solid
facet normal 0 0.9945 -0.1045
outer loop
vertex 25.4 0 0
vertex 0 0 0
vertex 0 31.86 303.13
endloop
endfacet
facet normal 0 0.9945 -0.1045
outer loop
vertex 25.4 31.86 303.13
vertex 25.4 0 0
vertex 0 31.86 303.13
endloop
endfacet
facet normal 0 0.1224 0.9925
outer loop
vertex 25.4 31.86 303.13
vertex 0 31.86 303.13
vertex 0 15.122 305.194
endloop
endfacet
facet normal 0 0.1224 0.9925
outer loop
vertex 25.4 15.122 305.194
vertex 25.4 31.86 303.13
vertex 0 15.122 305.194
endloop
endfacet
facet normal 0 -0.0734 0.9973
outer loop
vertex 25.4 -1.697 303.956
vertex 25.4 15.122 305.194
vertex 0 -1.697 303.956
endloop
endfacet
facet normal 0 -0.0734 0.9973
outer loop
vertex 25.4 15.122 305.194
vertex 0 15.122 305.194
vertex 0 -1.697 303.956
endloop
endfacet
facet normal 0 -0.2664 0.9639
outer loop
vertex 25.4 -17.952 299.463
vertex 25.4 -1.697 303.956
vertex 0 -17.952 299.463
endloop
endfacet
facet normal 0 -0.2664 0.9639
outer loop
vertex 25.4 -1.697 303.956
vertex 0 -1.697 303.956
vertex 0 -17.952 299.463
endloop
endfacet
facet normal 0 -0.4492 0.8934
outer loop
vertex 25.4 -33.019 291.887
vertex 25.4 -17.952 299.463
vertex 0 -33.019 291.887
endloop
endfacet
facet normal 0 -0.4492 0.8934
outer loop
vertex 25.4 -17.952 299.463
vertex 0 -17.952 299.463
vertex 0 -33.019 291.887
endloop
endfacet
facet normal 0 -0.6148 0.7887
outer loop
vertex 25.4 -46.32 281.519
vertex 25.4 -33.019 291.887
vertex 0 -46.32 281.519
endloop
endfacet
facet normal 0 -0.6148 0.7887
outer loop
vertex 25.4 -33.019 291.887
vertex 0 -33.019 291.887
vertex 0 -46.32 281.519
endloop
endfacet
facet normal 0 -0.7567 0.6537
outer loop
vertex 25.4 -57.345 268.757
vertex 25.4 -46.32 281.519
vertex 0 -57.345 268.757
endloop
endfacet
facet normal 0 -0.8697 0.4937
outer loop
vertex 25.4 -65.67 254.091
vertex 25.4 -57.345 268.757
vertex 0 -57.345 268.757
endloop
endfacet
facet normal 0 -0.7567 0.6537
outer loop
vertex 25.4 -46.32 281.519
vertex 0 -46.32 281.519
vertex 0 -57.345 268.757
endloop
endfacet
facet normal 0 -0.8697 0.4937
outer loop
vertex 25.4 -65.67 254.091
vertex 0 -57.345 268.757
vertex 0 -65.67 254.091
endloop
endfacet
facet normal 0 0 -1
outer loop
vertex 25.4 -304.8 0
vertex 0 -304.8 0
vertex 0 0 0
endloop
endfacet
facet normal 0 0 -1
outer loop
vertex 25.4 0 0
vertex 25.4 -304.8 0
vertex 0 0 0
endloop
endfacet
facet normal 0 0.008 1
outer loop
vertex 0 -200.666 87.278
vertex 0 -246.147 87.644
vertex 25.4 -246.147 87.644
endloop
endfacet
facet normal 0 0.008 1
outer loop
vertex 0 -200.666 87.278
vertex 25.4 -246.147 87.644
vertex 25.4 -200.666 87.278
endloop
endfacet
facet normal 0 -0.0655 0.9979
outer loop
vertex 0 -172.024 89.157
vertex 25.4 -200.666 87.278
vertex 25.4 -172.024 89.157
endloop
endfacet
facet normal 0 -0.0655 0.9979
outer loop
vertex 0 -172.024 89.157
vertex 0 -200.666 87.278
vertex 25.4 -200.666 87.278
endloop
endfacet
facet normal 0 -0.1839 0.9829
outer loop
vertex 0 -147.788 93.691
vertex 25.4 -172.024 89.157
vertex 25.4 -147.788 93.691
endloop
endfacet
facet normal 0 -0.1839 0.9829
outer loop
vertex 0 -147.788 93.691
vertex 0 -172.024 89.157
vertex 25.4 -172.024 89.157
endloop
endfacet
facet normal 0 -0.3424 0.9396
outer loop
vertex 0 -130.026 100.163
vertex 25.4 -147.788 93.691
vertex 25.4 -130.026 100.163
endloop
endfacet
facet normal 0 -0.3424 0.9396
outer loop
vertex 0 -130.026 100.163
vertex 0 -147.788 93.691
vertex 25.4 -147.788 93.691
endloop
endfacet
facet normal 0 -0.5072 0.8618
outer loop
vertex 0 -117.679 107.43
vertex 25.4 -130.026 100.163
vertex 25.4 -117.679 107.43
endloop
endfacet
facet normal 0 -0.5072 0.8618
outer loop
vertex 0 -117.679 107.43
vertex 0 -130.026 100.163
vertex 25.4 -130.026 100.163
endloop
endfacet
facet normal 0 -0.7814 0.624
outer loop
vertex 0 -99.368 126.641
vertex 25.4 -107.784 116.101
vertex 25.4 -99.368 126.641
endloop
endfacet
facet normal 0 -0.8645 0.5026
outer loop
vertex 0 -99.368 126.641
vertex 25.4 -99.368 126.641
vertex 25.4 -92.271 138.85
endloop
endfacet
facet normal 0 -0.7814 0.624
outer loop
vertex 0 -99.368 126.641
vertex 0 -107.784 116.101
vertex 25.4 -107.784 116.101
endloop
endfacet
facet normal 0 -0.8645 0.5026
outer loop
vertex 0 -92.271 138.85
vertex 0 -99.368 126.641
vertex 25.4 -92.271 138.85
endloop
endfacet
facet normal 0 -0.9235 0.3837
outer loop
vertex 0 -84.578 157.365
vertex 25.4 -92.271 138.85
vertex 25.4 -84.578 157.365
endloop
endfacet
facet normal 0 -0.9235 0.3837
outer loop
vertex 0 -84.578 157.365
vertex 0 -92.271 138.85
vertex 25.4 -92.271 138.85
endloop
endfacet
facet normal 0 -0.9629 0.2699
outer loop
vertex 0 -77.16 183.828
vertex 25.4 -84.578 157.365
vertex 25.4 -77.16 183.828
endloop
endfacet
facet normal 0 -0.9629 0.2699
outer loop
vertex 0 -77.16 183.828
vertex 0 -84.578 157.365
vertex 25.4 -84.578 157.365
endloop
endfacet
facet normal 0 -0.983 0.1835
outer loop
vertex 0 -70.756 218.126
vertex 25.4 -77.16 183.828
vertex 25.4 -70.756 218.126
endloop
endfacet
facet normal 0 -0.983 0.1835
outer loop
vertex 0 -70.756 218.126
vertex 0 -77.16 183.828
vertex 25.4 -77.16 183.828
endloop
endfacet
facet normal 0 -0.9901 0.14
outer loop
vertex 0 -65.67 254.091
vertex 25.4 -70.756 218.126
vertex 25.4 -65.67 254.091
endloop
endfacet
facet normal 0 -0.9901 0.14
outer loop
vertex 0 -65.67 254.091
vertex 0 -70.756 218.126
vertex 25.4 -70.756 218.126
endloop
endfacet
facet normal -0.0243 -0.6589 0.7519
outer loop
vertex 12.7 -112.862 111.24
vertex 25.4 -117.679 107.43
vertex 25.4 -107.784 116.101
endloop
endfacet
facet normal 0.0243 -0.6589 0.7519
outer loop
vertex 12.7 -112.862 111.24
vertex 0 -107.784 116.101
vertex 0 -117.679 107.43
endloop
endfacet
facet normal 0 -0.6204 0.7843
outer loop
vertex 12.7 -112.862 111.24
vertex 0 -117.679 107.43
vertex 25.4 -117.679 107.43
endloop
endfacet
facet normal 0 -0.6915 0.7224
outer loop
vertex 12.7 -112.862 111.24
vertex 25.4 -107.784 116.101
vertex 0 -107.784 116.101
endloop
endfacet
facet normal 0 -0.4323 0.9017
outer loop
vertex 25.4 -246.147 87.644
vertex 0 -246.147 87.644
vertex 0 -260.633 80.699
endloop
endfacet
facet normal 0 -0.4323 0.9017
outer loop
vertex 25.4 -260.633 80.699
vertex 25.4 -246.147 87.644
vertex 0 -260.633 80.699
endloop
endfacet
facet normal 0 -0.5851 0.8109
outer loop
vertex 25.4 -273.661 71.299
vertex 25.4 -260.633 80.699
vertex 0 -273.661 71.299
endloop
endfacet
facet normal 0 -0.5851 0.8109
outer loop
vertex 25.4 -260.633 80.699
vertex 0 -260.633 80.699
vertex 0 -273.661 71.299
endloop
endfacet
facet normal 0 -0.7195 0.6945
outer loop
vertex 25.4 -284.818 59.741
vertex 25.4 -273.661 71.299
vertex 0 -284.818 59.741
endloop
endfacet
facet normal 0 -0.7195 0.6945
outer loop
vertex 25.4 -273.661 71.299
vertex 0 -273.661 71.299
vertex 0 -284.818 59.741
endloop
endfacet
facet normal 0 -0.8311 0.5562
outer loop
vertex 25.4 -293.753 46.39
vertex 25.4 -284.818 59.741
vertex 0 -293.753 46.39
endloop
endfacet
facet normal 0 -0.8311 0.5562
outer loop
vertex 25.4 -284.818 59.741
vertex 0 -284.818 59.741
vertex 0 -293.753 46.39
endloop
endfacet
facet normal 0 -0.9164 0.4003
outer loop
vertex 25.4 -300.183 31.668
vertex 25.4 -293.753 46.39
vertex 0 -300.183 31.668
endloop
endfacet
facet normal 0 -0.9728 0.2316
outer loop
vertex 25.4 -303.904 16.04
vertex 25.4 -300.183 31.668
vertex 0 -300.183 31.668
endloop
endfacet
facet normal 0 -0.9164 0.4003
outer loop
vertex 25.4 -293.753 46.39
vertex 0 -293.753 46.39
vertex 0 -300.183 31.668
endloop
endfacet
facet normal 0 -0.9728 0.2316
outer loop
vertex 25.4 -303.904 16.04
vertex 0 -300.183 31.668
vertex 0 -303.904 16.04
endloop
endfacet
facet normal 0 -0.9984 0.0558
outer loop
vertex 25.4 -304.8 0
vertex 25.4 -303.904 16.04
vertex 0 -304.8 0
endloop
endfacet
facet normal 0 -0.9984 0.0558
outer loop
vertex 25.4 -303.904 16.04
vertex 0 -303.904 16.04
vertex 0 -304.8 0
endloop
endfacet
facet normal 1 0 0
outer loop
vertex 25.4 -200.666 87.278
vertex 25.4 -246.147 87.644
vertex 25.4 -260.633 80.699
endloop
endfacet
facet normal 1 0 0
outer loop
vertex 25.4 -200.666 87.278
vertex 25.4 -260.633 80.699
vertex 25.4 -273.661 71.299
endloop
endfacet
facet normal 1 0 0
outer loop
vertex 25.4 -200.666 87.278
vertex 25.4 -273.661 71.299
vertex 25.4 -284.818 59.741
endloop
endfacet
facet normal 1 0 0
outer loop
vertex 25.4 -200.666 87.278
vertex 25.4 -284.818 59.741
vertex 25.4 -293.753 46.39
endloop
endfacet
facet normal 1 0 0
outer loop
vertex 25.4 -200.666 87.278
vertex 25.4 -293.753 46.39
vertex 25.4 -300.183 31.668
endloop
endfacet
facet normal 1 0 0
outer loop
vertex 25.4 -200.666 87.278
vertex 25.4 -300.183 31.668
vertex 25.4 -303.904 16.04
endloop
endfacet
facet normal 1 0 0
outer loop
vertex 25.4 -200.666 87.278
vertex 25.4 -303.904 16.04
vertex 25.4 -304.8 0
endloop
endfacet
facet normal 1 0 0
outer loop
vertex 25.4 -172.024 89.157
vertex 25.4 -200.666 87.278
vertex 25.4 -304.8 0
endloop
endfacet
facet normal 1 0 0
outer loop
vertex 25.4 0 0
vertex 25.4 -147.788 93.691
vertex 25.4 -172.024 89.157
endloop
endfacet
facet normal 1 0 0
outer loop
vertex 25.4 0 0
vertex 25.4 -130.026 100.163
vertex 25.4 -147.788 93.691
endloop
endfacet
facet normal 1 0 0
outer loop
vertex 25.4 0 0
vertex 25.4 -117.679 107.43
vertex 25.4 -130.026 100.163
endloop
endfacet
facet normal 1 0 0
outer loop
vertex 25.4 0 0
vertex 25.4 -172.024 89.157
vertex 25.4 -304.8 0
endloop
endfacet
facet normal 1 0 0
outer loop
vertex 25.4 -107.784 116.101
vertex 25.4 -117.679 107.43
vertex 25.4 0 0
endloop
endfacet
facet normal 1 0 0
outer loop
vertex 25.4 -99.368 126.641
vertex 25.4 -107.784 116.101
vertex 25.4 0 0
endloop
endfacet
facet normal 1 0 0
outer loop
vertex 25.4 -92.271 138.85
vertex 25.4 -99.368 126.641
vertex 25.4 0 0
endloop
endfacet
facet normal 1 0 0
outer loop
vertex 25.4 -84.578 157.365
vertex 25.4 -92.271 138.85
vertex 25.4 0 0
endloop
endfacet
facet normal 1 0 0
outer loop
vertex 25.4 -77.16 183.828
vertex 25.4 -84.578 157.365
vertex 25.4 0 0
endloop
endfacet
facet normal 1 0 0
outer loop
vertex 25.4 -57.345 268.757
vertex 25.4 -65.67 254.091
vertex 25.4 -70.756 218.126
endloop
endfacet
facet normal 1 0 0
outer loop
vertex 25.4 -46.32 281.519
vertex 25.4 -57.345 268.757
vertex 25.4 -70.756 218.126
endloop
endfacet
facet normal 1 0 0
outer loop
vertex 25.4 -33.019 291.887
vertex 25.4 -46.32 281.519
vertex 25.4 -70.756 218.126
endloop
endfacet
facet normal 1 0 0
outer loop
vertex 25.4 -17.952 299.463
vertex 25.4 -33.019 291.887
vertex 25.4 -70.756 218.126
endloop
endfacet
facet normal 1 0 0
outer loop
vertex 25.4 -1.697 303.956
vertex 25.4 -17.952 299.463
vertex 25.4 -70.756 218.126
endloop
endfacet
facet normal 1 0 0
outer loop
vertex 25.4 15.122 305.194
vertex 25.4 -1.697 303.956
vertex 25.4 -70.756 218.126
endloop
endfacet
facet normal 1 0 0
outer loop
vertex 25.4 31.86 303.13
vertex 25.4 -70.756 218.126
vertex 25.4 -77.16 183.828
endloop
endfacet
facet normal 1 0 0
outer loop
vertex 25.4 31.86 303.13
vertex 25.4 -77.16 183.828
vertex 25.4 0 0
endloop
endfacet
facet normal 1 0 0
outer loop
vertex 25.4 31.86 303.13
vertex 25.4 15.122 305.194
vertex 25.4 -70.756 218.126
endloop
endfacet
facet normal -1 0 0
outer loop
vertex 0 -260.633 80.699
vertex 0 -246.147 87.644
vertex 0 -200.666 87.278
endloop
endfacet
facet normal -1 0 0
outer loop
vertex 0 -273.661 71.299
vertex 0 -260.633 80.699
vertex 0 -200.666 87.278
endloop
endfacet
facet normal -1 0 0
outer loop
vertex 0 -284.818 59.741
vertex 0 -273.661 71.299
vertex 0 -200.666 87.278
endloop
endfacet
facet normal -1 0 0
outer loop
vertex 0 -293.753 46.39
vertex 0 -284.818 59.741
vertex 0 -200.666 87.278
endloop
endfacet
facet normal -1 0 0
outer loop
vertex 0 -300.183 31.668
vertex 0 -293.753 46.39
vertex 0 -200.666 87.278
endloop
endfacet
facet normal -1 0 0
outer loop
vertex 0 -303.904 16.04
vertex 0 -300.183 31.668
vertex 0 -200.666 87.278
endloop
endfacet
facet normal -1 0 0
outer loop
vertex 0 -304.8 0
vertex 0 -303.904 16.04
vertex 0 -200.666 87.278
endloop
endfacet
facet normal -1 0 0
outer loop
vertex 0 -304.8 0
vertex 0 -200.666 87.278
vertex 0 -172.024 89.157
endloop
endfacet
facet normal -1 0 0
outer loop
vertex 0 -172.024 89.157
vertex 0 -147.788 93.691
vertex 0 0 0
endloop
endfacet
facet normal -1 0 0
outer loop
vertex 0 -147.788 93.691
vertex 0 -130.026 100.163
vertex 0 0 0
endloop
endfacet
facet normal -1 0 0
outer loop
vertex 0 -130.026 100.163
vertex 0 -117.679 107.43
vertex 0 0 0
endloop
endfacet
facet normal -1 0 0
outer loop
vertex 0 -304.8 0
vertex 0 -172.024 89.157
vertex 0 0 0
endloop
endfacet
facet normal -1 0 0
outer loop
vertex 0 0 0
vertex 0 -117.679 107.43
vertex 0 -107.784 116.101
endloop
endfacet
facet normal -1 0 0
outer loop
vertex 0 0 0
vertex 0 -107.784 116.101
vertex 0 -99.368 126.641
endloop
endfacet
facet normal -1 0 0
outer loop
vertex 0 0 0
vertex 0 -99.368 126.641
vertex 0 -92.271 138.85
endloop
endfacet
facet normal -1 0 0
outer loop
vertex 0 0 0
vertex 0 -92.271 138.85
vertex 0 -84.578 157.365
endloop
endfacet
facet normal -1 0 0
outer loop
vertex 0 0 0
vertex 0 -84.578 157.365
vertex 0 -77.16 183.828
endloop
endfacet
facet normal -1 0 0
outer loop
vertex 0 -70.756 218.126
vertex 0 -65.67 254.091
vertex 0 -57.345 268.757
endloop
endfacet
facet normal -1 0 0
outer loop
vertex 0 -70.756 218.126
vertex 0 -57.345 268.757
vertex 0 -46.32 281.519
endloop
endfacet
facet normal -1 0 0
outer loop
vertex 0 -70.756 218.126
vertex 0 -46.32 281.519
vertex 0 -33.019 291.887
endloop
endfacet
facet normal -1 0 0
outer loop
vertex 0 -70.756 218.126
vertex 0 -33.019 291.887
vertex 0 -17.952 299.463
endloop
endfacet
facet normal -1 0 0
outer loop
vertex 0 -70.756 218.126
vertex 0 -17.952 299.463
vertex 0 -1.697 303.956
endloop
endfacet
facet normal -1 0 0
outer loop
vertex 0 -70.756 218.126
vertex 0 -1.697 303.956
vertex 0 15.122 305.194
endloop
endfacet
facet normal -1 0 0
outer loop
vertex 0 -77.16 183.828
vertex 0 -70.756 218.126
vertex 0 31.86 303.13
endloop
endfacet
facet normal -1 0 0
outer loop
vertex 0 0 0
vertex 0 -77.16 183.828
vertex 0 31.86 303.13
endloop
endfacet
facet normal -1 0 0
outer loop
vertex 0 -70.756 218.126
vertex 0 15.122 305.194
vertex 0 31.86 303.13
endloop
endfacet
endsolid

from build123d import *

# Parameters (mm, degrees)
F1_DEPTH = 25.4


with BuildPart() as f1:
    # F0 (on Right) → F1 (new body)
    with BuildSketch(Plane.YZ):
        with BuildLine():
            Line((-304.8, 0), (0, 0))
            Line((0, 0), (31.860275604, 303.1302737082))
            ThreePointArc((31.860275604, 303.1302737082), (-25.6710248369, 296.0445279913), (-65.6702667475, 254.0907561779))
            add(Edge.make_bspline(
                [(-246.146813035, 87.6441970468), (-194.5365692681, 86.4305306387), (-88.5158652272, 83.9373479358), (-73.4183843518, 196.3829828835), (-65.6702667475, 254.0907561779)],
                knots=[0, 0, 0, 0, 0.486794011, 1, 1, 1, 1], degree=3))
            ThreePointArc((-246.146813035, 87.6441970468), (-289.5827369697, 53.2643345738), (-304.8, 0))
        make_face()
    extrude(amount=F1_DEPTH)


solid = f1.part
